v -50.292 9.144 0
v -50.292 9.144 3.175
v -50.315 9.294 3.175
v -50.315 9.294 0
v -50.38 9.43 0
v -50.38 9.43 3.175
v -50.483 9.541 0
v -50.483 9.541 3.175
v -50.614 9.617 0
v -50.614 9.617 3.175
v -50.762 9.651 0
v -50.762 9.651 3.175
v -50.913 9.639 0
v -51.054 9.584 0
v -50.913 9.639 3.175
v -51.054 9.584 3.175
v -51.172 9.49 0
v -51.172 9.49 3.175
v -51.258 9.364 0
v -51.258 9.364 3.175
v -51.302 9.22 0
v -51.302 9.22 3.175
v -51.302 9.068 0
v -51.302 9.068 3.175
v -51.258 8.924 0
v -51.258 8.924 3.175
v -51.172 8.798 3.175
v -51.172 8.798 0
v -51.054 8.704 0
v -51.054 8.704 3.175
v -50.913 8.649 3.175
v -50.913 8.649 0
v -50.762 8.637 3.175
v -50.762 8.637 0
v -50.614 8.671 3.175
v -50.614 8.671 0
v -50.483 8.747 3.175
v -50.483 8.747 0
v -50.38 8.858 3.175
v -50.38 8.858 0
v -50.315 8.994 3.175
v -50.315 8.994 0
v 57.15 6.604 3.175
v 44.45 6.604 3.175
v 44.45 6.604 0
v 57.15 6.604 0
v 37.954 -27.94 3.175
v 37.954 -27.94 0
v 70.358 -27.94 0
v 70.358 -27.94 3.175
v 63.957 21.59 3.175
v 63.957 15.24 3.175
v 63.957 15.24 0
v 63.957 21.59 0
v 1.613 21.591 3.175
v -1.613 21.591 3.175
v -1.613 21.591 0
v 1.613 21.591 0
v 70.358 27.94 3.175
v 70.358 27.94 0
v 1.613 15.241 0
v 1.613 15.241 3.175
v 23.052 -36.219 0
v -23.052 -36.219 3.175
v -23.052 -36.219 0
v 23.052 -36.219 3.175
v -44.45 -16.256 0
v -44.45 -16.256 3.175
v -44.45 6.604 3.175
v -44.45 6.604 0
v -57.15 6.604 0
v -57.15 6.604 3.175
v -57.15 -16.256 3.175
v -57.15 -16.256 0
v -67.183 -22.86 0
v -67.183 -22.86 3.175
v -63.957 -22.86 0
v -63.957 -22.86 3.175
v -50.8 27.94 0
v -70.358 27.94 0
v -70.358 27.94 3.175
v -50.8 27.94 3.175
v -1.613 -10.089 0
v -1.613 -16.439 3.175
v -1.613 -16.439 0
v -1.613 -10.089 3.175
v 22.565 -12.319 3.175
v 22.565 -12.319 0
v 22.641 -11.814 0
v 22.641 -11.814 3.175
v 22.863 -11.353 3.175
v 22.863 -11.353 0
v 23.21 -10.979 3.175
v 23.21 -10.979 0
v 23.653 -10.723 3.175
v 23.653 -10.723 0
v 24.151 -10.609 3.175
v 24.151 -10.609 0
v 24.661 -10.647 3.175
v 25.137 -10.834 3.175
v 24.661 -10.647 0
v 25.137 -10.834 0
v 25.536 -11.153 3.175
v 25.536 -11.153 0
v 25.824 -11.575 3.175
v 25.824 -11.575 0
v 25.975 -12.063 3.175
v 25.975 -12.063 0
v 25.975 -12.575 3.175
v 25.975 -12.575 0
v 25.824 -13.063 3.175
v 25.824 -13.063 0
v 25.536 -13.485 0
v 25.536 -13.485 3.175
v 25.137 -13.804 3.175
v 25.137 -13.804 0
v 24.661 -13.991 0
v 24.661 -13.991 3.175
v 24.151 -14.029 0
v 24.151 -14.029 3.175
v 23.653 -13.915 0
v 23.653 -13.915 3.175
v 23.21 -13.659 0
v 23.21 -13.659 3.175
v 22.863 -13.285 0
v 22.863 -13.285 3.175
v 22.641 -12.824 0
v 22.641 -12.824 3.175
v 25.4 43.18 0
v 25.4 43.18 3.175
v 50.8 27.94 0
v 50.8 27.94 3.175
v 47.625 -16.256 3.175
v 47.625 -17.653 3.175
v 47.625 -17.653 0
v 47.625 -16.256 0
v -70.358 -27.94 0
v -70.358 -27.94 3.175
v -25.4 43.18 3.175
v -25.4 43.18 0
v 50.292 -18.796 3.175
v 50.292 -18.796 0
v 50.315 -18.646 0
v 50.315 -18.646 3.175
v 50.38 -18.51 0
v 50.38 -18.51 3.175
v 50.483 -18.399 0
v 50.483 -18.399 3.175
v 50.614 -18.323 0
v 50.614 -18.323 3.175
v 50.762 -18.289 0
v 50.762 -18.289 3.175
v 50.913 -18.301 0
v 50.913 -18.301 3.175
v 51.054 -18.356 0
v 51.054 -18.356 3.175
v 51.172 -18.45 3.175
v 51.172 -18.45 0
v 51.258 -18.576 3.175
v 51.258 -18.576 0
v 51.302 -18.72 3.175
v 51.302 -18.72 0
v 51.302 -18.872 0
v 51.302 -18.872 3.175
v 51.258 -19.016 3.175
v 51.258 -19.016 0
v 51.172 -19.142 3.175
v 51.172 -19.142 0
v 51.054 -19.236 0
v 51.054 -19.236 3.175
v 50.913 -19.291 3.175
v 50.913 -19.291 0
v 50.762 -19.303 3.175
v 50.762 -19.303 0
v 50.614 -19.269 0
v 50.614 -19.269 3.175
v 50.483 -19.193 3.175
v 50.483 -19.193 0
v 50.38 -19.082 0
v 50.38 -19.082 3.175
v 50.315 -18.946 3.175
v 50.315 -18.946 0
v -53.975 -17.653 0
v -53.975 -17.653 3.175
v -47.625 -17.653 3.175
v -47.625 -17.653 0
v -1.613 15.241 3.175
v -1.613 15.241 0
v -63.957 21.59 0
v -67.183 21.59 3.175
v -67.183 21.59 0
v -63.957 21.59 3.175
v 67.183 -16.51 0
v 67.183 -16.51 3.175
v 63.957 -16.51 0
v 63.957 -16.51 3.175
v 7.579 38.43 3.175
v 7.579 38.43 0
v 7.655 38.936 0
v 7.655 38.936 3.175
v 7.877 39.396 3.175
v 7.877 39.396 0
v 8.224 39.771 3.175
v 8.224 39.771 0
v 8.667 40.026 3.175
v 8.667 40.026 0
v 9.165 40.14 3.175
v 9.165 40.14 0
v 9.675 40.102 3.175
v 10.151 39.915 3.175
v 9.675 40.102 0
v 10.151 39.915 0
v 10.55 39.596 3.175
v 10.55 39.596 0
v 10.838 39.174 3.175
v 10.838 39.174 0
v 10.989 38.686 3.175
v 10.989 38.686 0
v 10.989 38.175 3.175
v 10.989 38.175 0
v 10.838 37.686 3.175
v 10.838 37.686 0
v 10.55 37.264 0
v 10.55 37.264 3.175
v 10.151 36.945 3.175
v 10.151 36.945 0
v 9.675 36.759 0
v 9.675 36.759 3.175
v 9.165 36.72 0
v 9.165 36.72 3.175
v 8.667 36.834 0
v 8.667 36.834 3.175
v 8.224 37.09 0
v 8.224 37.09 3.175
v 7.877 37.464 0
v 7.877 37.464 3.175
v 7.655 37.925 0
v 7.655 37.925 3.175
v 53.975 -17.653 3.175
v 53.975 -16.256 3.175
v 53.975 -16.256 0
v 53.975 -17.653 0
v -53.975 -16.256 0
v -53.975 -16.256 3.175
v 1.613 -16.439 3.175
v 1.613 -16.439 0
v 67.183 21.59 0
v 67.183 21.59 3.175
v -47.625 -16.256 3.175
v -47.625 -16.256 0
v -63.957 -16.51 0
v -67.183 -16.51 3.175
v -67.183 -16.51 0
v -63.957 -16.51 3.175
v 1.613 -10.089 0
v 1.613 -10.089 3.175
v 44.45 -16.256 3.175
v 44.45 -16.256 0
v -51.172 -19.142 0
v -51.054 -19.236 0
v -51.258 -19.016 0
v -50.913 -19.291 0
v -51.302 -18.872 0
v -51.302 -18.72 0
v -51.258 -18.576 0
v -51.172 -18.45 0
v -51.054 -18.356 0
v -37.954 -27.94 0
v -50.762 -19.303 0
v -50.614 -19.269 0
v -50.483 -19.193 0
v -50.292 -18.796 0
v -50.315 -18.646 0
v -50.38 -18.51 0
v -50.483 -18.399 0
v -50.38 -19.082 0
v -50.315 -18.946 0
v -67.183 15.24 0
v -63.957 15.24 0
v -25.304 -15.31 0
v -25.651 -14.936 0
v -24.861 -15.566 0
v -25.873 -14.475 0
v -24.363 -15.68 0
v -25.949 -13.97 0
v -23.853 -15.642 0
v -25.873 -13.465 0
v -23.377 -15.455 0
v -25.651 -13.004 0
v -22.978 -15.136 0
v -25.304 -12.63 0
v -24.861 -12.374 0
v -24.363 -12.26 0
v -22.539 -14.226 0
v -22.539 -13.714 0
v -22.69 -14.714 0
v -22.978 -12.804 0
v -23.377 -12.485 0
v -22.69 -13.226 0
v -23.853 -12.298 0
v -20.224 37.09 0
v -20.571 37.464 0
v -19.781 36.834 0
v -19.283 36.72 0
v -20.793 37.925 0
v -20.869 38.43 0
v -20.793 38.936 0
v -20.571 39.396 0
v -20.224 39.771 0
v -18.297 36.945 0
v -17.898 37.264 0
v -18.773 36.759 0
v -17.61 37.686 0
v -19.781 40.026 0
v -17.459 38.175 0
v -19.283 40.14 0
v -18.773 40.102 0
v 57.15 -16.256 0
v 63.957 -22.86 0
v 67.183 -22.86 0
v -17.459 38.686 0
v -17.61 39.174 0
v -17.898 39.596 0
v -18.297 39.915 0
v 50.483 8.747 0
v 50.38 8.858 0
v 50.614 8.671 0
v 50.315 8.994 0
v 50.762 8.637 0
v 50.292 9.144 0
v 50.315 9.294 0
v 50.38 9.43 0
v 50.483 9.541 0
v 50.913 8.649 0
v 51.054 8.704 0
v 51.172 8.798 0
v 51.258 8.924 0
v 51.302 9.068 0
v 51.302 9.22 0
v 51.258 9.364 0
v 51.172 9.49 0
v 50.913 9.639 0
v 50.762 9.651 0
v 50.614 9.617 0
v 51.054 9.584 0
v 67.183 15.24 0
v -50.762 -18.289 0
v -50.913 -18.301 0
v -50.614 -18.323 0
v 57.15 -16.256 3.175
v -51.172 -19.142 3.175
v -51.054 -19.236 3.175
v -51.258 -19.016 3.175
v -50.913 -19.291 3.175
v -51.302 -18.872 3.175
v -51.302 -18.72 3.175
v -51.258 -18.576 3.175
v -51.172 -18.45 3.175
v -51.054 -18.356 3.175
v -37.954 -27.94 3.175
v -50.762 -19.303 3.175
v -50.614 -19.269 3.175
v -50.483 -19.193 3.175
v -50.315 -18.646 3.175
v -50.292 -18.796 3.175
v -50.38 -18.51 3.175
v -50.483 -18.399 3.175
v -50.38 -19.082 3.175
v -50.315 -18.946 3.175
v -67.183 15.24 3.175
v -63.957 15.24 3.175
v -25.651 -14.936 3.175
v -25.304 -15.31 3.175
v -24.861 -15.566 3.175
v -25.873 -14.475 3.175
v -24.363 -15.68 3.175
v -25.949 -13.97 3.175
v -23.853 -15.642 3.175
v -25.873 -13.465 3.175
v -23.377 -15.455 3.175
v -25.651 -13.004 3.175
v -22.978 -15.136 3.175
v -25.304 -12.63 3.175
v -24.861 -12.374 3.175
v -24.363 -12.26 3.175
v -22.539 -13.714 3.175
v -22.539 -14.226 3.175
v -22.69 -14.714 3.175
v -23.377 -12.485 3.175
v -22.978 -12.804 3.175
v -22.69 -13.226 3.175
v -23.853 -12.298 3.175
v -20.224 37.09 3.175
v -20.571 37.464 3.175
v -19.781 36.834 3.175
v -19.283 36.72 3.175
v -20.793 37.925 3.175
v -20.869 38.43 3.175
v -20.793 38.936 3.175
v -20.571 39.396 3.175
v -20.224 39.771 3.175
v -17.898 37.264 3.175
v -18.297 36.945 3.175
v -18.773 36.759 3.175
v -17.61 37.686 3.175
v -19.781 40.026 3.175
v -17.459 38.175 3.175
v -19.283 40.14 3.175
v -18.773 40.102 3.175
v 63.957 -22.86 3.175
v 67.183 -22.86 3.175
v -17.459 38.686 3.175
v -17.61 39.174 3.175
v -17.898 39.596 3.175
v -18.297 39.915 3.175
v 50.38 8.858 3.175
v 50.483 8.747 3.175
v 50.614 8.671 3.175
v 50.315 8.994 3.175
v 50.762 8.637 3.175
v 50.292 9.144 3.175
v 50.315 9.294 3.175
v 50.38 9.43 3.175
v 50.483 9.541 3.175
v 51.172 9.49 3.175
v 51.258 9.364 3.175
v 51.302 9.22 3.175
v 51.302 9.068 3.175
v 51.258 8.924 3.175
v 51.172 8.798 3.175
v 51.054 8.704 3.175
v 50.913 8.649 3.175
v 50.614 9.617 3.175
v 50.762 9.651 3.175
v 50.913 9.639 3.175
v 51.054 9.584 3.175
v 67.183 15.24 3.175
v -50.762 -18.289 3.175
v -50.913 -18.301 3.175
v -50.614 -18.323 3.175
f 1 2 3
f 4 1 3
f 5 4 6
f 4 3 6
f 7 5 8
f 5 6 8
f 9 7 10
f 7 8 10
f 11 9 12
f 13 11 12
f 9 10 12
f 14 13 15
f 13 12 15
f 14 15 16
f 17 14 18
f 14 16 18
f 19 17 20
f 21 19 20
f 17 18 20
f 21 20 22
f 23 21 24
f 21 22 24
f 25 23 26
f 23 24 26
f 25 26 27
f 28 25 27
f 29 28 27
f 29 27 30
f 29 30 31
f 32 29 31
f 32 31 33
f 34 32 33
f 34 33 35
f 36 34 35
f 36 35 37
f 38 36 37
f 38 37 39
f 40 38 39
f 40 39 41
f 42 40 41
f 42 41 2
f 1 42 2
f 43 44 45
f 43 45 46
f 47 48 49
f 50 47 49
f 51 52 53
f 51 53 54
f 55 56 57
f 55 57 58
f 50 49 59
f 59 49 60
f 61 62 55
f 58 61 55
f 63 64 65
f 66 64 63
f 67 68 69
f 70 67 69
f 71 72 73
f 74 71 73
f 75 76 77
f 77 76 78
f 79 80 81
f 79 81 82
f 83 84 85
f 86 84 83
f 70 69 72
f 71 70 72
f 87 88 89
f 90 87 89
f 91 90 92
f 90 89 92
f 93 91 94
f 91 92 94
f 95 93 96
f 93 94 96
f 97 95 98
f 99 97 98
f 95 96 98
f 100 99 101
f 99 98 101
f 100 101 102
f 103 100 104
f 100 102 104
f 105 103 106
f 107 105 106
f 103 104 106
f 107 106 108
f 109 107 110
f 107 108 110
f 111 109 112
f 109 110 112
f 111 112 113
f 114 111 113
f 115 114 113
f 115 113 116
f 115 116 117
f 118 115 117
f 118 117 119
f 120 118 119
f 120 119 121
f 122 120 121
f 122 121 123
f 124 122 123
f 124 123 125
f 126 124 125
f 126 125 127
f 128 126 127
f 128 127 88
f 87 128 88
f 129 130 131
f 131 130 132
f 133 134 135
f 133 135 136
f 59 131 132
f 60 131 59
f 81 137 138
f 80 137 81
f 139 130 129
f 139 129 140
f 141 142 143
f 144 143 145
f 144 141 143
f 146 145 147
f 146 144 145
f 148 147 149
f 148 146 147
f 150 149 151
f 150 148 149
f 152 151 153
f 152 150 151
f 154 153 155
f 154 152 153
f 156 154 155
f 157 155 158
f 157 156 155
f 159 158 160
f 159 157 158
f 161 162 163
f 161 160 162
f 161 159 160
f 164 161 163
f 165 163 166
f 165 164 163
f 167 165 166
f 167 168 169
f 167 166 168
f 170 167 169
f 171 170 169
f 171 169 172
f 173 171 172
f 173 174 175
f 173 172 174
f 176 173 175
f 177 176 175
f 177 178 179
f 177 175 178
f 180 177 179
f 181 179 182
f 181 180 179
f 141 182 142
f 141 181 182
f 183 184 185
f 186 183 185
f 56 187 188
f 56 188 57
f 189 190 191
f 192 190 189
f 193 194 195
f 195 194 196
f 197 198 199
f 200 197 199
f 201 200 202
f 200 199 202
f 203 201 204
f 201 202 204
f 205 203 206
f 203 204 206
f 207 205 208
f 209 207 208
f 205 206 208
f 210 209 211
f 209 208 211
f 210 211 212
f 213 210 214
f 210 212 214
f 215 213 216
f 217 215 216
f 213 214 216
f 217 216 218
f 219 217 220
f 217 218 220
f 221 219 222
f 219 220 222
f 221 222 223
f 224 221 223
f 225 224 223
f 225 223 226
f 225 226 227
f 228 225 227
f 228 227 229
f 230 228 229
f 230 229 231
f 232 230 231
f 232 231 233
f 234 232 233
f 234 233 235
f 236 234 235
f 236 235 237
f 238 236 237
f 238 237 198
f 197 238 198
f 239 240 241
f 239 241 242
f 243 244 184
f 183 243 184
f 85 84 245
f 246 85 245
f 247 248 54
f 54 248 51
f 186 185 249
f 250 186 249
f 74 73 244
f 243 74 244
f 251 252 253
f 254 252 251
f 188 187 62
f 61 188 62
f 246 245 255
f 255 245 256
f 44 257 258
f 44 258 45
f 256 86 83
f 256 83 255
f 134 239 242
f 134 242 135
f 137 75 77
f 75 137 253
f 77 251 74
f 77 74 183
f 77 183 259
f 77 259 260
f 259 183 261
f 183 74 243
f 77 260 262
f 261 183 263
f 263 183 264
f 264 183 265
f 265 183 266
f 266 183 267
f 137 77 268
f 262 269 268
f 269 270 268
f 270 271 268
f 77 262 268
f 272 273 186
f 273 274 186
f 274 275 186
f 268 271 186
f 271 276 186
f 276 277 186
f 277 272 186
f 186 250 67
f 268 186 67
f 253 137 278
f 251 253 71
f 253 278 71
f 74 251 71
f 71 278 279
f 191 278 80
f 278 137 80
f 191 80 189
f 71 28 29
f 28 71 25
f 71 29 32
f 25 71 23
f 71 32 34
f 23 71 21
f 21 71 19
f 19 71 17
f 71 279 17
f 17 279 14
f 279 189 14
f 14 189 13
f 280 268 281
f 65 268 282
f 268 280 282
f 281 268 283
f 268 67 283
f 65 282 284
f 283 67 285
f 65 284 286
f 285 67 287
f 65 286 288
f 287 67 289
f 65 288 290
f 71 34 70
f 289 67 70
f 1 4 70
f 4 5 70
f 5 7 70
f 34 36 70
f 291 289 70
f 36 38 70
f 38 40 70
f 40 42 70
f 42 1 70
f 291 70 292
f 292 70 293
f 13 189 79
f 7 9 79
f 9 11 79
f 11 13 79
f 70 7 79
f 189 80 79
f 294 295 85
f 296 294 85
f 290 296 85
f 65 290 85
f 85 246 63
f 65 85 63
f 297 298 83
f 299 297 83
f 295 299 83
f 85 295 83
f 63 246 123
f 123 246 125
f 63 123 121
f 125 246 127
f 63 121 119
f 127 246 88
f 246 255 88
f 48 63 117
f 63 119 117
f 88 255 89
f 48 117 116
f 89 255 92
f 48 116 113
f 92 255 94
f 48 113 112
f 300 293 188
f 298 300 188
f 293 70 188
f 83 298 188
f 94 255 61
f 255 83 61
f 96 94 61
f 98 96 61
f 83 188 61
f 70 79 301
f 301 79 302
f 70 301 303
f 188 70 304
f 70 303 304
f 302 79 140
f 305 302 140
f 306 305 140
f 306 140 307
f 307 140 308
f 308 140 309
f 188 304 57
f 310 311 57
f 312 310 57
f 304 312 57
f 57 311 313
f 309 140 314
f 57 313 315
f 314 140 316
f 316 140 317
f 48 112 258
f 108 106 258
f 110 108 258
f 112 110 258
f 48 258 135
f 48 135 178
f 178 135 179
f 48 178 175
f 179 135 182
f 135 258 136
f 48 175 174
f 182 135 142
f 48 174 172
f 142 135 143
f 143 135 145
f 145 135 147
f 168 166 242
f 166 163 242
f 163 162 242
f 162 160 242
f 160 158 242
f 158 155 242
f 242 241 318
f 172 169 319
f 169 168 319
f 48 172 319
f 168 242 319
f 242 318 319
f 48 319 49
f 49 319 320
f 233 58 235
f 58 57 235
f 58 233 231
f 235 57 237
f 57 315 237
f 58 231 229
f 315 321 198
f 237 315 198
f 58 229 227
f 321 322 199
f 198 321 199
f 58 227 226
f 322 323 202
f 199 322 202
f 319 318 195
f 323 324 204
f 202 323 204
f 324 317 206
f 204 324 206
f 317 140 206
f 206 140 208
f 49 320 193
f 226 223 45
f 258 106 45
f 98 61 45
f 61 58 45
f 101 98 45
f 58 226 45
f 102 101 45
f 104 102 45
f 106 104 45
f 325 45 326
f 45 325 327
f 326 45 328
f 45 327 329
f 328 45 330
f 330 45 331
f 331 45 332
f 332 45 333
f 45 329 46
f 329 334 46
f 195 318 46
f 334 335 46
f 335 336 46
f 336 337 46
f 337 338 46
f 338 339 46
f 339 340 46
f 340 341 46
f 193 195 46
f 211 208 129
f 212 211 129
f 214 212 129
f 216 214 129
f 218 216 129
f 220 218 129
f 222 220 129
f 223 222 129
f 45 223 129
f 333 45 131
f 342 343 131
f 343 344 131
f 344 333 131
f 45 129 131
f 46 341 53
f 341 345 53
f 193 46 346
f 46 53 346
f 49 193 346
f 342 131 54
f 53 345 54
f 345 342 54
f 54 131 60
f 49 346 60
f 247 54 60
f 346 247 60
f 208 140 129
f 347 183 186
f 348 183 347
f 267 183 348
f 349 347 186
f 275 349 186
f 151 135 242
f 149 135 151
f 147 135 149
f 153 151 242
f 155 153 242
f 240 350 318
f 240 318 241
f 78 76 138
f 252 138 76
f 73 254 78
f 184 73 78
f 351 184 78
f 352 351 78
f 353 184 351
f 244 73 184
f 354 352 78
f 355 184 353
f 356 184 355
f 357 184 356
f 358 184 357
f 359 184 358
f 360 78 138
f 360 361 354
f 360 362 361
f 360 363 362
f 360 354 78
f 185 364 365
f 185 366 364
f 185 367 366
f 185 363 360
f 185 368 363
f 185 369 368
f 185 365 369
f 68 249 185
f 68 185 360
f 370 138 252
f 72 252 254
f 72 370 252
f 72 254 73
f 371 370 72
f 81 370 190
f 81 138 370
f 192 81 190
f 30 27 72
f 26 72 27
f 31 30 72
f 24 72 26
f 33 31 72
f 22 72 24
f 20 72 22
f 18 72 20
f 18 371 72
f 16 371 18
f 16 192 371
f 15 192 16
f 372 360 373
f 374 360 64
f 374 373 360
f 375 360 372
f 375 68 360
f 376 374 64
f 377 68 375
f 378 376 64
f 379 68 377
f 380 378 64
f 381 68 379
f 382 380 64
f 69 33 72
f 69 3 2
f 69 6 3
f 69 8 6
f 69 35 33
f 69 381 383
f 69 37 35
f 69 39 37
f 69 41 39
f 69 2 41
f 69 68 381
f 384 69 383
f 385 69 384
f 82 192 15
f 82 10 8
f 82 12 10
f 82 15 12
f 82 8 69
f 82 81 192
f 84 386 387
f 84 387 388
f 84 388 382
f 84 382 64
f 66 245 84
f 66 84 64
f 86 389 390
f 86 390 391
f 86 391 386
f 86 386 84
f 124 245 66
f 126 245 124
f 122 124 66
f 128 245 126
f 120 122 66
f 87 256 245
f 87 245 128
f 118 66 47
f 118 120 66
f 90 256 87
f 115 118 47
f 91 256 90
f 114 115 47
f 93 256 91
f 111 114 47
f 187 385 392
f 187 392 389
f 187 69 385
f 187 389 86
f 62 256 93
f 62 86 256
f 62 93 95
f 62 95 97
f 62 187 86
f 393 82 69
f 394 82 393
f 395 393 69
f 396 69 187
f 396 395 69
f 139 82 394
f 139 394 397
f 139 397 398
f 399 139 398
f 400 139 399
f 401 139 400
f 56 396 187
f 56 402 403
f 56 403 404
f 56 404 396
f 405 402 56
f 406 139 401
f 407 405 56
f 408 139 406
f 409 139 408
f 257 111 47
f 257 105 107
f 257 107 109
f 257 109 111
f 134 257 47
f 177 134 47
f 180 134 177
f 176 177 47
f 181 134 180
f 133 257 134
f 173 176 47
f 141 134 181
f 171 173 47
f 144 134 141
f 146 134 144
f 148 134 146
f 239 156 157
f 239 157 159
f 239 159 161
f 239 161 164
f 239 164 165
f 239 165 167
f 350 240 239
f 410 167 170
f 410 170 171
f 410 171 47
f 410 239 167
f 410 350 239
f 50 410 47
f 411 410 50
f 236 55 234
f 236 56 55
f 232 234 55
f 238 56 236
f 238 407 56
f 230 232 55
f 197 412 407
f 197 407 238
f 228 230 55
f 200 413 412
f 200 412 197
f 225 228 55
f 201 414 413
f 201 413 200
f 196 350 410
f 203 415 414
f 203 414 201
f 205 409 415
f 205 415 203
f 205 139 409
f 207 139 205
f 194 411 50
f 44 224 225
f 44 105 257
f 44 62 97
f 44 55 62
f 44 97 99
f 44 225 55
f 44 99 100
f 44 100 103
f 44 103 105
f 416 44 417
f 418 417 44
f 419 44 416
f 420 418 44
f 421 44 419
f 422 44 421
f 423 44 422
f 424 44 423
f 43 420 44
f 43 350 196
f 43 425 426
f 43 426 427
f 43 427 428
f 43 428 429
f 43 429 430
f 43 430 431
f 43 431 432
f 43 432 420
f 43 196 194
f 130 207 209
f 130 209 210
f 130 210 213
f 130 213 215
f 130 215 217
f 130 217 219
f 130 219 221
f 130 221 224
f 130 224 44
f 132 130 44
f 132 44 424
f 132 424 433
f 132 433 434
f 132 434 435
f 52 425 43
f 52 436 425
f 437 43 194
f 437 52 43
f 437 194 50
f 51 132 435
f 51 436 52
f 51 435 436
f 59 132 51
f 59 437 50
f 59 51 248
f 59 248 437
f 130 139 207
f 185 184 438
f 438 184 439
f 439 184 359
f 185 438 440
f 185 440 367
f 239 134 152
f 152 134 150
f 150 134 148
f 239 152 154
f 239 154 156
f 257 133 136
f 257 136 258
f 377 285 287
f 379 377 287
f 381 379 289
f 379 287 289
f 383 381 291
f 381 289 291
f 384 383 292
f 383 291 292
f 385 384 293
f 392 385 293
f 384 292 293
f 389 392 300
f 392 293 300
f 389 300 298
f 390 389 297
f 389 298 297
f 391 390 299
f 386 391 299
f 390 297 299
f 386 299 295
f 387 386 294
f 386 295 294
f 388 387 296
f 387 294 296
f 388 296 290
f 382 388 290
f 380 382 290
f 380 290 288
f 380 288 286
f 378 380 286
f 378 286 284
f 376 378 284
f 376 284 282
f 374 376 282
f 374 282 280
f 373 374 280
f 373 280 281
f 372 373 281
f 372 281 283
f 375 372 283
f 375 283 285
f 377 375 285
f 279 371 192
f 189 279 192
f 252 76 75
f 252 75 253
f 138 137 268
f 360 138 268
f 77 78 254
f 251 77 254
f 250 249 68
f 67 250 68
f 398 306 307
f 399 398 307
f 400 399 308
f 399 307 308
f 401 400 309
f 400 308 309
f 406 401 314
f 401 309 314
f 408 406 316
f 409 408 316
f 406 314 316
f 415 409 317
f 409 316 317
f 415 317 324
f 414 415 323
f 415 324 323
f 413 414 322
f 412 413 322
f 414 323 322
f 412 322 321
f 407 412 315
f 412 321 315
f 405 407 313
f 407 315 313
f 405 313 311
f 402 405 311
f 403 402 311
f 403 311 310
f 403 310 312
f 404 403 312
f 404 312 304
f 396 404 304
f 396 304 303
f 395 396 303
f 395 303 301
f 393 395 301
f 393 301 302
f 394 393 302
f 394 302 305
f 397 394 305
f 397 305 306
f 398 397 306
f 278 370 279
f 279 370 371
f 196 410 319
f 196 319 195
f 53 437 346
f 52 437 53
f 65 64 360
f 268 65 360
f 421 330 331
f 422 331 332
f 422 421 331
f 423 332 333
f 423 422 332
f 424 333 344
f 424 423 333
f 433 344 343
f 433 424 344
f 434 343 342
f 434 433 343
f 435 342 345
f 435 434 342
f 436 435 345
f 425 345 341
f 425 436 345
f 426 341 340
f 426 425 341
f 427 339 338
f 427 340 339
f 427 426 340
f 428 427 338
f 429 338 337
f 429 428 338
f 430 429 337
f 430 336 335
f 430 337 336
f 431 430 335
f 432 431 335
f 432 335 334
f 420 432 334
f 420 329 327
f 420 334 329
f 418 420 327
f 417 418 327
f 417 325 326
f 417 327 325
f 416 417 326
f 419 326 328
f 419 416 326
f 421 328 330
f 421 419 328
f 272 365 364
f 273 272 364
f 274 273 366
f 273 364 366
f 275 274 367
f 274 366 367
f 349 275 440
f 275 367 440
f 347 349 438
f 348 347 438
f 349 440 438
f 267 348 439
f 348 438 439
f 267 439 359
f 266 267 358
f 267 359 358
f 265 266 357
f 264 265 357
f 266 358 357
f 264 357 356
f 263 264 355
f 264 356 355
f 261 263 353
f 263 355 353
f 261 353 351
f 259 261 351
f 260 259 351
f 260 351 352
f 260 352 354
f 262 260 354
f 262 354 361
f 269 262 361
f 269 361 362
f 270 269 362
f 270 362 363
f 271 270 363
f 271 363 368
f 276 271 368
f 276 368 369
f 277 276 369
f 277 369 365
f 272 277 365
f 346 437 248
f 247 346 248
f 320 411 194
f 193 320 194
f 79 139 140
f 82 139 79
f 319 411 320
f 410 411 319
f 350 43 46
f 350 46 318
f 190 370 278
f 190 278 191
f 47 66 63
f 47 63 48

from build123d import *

# Parameters (mm, degrees)
SKETCH1_W                          = 140.716
SKETCH1_H                          = 55.88
BOSS_EXTRUDE1_DEPTH                = 3.175
SKETCH2_W                          = 3.2258
SKETCH2_H                          = 6.35
HOLES_FOR_TABS_DEPTH               = 4.175
SKETCH3_W                          = 3.2258
SKETCH3_H                          = 6.35
CUT_FOR_TABS_NOSEPANEL_DEPTH       = 4.175
SKETCH5_R                          = 0.508
CUT_FOR_OPTIONAL_MOTORS_EARS_DEPTH = 4.175
BOSS_EXTRUDE2_DEPTH                = 3.175
SKETCH7_R                          = 1.7145
CUT_FOR_ARDUINO_MOUNT_HOLES_DEPTH  = 4.175


with BuildPart() as part:
    # Sketch1 → Boss-Extrude1 (new body)
    with BuildSketch(Plane.XY):
        Rectangle(SKETCH1_W, SKETCH1_H)
    extrude(amount=BOSS_EXTRUDE1_DEPTH)

    # Sketch2 → holes for tabs (cut, through all)
    with BuildSketch(Plane.XY.offset(3.175)):
        with Locations((-65.5701, 18.415)):
            Rectangle(SKETCH2_W, SKETCH2_H)
        with Locations((-65.5701, -19.685)):
            Rectangle(SKETCH2_W, SKETCH2_H)
    holes_for_tabs = extrude(amount=-HOLES_FOR_TABS_DEPTH, mode=Mode.SUBTRACT)

    # Mirror1: holes for tabs across plane
    add(holes_for_tabs.mirror(Plane(origin=(0, 0, 0), x_dir=(0, 0, 1), z_dir=(1, 0, 0))), mode=Mode.SUBTRACT)

    # Sketch3 → cut for tabs, nosepanel (cut, through all)
    with BuildSketch(Plane.XY.offset(3.175)):
        with Locations((0, 18.415547881)):
            Rectangle(SKETCH3_W, SKETCH3_H)
        with Locations((0, -13.264075424)):
            Rectangle(SKETCH3_W, SKETCH3_H)
    extrude(amount=-CUT_FOR_TABS_NOSEPANEL_DEPTH, mode=Mode.SUBTRACT)

    # Sketch5 → cut for optional motors (ears) (cut, through all)
    with BuildSketch(Plane.XY.offset(3.175)):
        with Locations((-50.8, -18.796)):
            Circle(SKETCH5_R)
        with Locations((-50.8, 9.144)):
            Circle(SKETCH5_R)
        Polygon((-44.45, 6.604), (-57.15, 6.604), (-57.15, -16.256), (-53.975, -16.256), (-53.975, -17.653), (-47.625, -17.653), (-47.625, -16.256), (-44.45, -16.256), align=None)
    cut_for_optional_motors_ears = extrude(amount=-CUT_FOR_OPTIONAL_MOTORS_EARS_DEPTH, mode=Mode.SUBTRACT)

    # Mirror2: cut for optional motors (ears) across plane
    add(cut_for_optional_motors_ears.mirror(Plane(origin=(0, 0, 0), x_dir=(0, 0, 1), z_dir=(1, 0, 0))), mode=Mode.SUBTRACT)

    # Sketch6 → Boss-Extrude2 (add)
    with BuildSketch(Plane.XY.offset(3.175)):
        Polygon((0, -27.94), (0, -36.218644949), (-23.051937452, -36.218644949), (-37.953832941, -27.94), align=None)
        Polygon((0, 27.94), (0, 43.18), (-25.4, 43.18), (-50.8, 27.94), align=None)
    boss_extrude2 = extrude(amount=-BOSS_EXTRUDE2_DEPTH)

    # Mirror3: Boss-Extrude2 across plane
    add(boss_extrude2.mirror(Plane(origin=(0, 0, 0), x_dir=(0, 0, 1), z_dir=(1, 0, 0))))

    # Sketch7 → cut for arduino mount holes (cut, through all)
    with BuildSketch(Plane(origin=(0, 0, 0), x_dir=(-1, 0, 0), z_dir=(0, 0, -1))):
        with Locations((19.154550283, 38.4302)):
            Circle(SKETCH7_R)
        with Locations((-9.293449717, 38.4302)):
            Circle(SKETCH7_R)
        with Locations((24.234550283, -13.97)):
            Circle(SKETCH7_R)
        with Locations((-24.279449717, -12.319)):
            Circle(SKETCH7_R)
    extrude(amount=-CUT_FOR_ARDUINO_MOUNT_HOLES_DEPTH, mode=Mode.SUBTRACT)


solid = part.part
